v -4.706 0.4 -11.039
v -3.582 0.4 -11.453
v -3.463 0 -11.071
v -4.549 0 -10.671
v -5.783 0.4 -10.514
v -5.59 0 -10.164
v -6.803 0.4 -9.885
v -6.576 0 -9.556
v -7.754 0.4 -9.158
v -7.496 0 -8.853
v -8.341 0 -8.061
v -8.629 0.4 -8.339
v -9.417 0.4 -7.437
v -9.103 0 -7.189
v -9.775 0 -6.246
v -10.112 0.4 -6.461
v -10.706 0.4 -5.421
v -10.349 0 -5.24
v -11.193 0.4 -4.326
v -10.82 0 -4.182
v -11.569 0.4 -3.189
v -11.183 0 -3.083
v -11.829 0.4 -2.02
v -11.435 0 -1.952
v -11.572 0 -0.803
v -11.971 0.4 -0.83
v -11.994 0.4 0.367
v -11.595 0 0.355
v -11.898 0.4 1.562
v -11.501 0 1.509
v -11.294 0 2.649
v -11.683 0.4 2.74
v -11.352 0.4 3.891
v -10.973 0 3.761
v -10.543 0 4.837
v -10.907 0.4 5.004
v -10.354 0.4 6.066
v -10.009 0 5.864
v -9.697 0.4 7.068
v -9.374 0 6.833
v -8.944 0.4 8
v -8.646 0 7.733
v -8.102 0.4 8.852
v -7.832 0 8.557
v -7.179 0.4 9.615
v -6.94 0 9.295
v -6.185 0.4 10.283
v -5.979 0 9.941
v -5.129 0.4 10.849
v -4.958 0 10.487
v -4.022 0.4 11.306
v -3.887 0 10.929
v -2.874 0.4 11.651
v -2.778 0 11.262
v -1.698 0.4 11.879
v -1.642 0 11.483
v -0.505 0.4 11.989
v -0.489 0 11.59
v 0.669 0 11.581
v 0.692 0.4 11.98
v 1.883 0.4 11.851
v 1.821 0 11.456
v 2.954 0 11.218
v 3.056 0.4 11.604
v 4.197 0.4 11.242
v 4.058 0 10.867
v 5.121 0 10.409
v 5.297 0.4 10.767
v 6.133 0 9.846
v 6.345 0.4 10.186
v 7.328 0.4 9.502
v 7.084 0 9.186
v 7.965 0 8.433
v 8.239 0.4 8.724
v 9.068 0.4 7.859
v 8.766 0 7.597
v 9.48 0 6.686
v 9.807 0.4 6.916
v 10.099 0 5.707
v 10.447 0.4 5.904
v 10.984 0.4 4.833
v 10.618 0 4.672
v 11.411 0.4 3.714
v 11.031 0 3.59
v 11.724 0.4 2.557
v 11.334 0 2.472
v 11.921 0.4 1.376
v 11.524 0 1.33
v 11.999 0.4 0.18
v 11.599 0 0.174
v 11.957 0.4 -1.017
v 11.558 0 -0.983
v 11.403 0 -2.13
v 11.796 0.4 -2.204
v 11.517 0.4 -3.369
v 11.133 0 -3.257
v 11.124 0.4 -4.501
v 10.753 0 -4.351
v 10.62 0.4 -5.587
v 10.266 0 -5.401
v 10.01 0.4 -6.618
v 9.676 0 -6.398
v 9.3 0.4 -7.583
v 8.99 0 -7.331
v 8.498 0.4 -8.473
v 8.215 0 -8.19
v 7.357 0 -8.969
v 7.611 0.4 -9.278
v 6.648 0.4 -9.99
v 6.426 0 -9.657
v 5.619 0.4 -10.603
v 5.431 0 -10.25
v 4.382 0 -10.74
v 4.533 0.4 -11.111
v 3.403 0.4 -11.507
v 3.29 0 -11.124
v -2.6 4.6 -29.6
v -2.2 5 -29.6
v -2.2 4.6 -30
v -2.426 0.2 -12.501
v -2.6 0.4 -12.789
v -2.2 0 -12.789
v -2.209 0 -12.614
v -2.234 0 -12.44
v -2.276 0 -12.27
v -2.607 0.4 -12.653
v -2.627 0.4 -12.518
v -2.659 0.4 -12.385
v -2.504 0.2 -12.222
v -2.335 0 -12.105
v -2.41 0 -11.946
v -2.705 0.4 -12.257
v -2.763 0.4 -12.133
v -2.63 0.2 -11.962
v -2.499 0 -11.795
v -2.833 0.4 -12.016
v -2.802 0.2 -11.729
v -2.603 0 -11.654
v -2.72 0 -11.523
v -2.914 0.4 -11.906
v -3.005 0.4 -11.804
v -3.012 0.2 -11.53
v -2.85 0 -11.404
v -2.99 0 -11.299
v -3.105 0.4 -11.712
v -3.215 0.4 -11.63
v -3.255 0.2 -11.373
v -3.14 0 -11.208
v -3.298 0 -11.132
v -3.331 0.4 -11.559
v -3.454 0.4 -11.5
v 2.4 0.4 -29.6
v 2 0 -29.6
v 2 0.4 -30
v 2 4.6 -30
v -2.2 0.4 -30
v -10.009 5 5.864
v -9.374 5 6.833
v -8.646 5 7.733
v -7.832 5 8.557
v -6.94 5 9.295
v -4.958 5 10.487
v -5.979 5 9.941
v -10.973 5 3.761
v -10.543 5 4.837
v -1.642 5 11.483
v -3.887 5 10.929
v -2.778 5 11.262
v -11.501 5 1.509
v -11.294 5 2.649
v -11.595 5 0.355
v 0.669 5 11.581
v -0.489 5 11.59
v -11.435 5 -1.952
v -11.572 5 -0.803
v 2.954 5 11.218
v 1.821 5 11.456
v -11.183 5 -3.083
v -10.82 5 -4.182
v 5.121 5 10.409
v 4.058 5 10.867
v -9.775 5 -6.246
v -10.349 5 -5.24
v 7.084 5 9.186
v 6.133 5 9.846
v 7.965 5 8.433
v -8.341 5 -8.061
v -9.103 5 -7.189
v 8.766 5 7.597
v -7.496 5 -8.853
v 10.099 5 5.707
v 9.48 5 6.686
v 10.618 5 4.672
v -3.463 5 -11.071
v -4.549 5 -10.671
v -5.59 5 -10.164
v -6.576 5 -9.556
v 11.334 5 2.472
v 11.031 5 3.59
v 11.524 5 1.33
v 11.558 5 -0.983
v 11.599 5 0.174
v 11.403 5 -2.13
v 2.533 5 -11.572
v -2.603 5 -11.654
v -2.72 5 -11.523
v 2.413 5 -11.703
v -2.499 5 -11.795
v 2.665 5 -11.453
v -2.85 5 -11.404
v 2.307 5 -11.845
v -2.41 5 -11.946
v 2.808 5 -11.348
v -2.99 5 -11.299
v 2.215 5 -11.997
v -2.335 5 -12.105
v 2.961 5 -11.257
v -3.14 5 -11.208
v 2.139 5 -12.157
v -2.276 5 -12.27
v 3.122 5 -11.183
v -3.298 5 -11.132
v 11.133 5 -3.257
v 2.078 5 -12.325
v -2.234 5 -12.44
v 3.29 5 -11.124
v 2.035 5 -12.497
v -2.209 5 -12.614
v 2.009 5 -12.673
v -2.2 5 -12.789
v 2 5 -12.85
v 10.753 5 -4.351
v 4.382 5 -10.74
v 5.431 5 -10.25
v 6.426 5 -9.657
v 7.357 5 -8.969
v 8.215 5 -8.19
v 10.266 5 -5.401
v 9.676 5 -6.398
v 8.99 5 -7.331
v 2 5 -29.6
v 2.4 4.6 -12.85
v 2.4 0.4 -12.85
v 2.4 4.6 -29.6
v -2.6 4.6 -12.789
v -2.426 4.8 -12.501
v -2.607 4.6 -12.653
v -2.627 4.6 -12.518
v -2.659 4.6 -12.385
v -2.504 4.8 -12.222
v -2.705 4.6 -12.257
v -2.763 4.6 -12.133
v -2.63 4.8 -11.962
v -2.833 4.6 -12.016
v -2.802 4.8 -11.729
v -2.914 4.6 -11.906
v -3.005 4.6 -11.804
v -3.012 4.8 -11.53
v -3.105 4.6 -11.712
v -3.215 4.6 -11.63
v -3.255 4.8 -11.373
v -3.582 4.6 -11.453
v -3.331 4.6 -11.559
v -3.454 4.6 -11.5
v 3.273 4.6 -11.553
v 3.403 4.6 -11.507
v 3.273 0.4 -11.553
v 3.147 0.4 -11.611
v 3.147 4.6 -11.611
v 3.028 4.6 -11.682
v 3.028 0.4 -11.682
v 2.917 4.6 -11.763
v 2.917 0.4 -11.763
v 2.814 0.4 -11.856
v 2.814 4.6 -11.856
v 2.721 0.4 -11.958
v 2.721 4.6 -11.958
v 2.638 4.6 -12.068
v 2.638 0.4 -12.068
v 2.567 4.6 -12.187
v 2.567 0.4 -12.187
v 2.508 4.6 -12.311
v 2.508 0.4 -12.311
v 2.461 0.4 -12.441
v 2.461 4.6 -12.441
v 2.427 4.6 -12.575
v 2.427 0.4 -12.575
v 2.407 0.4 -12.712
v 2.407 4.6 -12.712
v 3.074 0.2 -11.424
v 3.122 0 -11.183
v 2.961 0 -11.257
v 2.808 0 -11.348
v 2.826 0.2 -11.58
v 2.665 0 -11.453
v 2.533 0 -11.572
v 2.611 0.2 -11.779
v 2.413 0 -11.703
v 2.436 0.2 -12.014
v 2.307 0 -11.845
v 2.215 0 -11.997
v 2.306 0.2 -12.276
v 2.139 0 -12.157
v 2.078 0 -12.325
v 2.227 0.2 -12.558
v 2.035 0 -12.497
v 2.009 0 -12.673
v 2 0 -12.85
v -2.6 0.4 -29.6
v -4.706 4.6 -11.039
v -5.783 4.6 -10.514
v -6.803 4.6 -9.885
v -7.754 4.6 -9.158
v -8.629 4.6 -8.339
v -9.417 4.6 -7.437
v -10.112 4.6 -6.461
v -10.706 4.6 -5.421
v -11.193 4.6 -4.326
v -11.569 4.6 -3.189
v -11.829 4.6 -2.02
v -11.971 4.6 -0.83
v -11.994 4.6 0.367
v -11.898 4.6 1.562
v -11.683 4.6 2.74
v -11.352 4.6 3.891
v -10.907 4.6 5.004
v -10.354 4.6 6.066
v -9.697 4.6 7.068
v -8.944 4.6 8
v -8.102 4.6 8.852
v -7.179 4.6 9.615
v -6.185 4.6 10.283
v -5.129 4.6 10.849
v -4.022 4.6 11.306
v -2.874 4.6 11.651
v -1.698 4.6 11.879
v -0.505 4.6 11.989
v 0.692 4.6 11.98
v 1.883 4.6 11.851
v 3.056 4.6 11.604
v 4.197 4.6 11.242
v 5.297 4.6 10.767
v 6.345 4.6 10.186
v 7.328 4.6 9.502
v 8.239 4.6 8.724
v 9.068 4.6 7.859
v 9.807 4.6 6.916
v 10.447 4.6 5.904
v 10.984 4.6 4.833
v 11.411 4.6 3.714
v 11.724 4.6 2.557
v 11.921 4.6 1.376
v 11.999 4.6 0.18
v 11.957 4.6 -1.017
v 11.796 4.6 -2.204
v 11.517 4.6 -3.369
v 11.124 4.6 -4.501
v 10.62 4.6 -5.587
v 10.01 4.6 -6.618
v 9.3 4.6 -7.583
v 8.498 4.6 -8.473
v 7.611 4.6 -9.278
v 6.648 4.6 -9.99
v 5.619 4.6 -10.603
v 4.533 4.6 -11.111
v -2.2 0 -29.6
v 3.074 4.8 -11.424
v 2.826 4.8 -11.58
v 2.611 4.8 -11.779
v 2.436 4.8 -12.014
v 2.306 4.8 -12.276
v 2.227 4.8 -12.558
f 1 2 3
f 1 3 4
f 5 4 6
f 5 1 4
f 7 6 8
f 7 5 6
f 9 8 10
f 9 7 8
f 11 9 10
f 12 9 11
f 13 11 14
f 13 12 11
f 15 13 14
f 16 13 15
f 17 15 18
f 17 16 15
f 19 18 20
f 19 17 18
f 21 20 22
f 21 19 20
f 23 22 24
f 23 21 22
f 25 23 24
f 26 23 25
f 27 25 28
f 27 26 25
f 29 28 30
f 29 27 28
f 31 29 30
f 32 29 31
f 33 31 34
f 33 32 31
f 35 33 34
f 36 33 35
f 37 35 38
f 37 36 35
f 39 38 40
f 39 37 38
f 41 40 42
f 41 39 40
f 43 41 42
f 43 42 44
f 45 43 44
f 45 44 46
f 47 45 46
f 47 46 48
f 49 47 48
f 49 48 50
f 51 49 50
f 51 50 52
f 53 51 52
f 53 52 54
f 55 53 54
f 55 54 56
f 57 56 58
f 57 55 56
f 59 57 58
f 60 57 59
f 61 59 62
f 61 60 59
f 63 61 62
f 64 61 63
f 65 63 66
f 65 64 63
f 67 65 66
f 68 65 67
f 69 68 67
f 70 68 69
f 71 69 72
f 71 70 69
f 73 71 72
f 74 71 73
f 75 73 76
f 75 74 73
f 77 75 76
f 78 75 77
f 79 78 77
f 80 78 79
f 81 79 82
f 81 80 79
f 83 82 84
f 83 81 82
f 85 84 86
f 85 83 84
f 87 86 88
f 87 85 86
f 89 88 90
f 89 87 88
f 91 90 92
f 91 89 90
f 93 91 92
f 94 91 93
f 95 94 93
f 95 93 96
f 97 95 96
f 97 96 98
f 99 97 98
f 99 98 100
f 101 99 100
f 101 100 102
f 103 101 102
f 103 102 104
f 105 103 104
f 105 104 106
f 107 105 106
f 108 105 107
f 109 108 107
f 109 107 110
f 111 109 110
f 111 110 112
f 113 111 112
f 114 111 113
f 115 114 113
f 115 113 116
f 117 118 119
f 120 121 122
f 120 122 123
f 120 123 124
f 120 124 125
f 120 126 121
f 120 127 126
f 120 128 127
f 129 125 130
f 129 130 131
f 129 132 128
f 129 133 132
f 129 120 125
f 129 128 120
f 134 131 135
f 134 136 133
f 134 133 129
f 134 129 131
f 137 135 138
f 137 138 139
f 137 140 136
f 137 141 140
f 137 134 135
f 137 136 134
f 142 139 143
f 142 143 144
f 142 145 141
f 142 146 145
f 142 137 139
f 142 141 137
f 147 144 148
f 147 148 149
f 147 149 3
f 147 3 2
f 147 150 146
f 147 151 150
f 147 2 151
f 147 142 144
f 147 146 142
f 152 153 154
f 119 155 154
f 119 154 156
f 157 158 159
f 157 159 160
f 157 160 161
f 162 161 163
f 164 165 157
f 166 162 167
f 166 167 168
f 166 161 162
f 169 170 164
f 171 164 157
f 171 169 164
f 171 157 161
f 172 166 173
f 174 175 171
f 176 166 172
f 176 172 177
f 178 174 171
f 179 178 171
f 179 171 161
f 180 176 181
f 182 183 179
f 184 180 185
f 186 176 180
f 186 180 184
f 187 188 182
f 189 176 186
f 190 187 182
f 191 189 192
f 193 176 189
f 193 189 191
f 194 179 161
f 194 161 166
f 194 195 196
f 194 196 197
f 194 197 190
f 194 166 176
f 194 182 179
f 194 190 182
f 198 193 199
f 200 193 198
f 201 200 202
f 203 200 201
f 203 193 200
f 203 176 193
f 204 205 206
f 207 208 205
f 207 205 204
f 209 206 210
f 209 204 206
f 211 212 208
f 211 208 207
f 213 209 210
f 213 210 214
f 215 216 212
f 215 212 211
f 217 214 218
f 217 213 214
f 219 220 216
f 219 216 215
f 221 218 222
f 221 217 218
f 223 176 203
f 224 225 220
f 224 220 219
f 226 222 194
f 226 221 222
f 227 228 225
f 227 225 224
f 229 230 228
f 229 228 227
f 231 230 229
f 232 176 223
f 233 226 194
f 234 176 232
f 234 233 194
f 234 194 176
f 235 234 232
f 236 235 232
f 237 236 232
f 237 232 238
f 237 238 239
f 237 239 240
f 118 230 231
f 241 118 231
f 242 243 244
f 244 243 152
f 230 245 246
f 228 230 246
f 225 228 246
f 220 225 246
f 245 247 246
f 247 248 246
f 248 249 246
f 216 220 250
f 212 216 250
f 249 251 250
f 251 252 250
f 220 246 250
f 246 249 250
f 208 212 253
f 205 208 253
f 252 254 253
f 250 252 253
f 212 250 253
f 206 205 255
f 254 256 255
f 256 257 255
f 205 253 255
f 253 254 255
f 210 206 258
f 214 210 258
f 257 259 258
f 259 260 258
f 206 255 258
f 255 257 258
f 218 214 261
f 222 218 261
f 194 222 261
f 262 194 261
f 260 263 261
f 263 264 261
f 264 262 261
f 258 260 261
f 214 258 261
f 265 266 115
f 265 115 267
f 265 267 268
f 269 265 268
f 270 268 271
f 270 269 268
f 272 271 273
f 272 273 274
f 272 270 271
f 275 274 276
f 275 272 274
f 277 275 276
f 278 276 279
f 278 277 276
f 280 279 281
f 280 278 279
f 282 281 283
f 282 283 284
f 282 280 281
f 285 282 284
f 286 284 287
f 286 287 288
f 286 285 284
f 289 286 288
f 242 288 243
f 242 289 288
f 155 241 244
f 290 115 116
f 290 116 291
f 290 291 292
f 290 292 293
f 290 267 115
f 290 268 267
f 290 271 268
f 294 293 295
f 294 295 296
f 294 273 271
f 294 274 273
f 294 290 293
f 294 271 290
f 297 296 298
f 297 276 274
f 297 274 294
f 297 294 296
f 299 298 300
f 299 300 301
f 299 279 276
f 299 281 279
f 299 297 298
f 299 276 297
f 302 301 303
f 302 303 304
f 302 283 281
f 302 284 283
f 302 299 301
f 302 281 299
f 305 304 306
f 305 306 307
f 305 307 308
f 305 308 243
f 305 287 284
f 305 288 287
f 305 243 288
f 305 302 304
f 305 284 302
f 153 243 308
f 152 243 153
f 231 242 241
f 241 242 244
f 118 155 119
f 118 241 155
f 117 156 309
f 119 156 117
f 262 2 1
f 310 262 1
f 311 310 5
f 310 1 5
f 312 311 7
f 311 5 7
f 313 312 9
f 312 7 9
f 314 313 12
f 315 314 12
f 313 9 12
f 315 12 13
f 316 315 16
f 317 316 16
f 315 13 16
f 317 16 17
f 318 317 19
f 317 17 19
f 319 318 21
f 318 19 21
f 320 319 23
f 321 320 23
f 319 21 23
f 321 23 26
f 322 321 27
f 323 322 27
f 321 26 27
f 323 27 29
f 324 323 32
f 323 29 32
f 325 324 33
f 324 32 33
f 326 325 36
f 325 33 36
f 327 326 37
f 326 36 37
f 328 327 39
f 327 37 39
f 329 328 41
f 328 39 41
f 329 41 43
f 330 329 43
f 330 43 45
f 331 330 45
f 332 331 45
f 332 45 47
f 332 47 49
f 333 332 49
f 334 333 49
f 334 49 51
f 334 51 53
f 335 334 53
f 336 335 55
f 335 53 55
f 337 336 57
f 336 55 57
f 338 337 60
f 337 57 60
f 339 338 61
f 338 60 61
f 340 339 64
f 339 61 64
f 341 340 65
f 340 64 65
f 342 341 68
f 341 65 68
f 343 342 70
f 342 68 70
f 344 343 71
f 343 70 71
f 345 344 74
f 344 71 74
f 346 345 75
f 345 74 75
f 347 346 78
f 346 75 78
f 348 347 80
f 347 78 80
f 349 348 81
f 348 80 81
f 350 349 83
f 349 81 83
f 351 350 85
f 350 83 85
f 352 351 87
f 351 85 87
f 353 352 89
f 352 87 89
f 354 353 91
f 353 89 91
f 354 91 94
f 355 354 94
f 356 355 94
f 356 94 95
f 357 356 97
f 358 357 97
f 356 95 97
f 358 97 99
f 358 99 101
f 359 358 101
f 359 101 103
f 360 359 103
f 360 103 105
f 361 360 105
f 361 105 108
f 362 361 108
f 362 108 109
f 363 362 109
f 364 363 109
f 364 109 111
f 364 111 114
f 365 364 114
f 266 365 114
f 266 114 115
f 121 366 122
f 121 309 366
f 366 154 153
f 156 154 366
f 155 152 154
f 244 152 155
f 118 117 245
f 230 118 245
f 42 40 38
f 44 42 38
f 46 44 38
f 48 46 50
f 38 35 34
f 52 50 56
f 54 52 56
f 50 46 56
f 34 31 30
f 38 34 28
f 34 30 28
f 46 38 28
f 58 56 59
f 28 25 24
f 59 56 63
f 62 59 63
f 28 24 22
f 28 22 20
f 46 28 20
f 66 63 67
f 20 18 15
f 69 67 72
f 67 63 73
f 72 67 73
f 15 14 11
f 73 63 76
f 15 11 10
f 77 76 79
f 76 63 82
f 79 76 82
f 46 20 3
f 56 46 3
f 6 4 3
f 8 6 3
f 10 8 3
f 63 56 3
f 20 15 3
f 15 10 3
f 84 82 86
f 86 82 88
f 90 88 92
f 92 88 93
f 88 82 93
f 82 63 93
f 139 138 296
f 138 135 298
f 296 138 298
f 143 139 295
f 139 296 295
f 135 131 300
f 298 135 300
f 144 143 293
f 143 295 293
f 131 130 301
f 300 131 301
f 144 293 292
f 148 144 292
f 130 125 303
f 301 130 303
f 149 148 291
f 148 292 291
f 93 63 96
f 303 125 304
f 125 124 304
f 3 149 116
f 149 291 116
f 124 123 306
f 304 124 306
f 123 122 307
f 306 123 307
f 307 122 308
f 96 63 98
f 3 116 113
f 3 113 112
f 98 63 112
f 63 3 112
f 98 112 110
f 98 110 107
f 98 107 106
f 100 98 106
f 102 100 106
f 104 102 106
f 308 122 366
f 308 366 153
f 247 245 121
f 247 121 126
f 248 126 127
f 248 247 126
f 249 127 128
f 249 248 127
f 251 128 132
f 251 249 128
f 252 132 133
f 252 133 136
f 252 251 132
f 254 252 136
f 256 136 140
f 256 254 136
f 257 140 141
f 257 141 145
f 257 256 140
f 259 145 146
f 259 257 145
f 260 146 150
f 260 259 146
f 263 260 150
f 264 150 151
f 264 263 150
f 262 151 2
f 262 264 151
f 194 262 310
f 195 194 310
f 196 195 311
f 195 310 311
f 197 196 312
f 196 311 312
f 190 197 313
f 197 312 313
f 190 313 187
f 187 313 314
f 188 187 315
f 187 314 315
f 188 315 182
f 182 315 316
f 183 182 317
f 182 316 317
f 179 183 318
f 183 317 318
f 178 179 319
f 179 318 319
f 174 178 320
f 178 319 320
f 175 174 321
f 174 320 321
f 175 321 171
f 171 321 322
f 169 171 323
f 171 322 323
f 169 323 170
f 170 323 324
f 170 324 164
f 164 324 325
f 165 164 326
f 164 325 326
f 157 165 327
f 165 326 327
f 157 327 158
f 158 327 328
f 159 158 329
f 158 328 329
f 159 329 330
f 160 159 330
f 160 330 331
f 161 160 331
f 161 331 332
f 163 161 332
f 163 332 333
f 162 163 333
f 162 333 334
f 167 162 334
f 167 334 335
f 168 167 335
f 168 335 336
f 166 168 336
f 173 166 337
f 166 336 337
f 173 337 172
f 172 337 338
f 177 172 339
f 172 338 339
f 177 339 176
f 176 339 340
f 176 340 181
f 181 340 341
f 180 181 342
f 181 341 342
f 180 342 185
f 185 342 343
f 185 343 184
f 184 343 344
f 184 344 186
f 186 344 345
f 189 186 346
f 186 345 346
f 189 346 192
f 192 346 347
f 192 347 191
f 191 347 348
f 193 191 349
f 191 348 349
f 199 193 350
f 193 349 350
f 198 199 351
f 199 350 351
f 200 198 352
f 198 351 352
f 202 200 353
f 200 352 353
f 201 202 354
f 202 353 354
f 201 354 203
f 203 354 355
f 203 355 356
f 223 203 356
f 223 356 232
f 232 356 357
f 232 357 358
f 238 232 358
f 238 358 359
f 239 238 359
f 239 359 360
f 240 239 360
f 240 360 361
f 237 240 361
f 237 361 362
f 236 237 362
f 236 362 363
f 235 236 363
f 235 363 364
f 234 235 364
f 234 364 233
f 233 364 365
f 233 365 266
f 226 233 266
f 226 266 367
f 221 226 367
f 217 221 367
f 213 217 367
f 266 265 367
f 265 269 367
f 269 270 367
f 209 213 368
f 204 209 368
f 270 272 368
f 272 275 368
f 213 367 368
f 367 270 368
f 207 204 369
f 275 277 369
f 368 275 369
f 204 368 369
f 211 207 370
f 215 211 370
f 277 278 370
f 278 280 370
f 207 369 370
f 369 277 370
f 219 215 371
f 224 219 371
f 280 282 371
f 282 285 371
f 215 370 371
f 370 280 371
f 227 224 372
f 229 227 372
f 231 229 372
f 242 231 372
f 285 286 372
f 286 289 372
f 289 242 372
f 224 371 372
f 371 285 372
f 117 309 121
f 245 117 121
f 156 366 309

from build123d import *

# Parameters (mm, degrees)
EXTRUDE_1_DEPTH = 5
FILLET_1_R      = 1.4
CHAMFER_1_SIZE  = 0.4


with BuildPart() as part:
    # 草图1 → 凸台-拉伸1 (new body)
    with BuildSketch(Plane(origin=(0, 0, 0), x_dir=(1, 0, 0), z_dir=(0, 1, 0))):
        with BuildLine():
            Line((-0.1, 30), (-2.6, 30))
            Line((-2.6, 30), (-2.6, 11.714947716))
            ThreePointArc((-2.6, 11.714947716), (0.102243606, -11.999564419), (2.4, 11.757550765))
            Line((2.4, 11.757550765), (2.4, 30))
            Line((2.4, 30), (-0.1, 30))
        make_face()
    extrude(amount=EXTRUDE_1_DEPTH)

    # 圆角1
    fillet_1_edges = [part.edges().sort_by_distance(p)[0] for p in [
        (-2.6, 2.5, -11.714947716),
        (2.4, 2.5, -11.757550765),
    ]]
    fillet(fillet_1_edges, radius=FILLET_1_R)

    # 倒角1
    chamfer_1_edges = [part.edges().sort_by_distance(p)[0] for p in [
        (-0.1, 5, -30),
        (2.4, 0, -21.424951362),
        (2.4, 5, -21.424951362),
        (0.093604691, 0, 11.999634918),
        (0.093604691, 5, 11.999634918),
        (-2.6, 5, -21.394528911),
        (2.678433931, 0, -12.011994881),
        (2.678433931, 5, -12.011994881),
        (-2.871932044, 0, -11.959924127),
        (-2.871932044, 5, -11.959924127),
        (-2.6, 0, -21.394528911),
        (-0.1, 0, -30),
        (-2.6, 2.5, -30),
        (2.4, 2.5, -30),
    ]]
    chamfer(chamfer_1_edges, length=CHAMFER_1_SIZE)


solid = part.part
